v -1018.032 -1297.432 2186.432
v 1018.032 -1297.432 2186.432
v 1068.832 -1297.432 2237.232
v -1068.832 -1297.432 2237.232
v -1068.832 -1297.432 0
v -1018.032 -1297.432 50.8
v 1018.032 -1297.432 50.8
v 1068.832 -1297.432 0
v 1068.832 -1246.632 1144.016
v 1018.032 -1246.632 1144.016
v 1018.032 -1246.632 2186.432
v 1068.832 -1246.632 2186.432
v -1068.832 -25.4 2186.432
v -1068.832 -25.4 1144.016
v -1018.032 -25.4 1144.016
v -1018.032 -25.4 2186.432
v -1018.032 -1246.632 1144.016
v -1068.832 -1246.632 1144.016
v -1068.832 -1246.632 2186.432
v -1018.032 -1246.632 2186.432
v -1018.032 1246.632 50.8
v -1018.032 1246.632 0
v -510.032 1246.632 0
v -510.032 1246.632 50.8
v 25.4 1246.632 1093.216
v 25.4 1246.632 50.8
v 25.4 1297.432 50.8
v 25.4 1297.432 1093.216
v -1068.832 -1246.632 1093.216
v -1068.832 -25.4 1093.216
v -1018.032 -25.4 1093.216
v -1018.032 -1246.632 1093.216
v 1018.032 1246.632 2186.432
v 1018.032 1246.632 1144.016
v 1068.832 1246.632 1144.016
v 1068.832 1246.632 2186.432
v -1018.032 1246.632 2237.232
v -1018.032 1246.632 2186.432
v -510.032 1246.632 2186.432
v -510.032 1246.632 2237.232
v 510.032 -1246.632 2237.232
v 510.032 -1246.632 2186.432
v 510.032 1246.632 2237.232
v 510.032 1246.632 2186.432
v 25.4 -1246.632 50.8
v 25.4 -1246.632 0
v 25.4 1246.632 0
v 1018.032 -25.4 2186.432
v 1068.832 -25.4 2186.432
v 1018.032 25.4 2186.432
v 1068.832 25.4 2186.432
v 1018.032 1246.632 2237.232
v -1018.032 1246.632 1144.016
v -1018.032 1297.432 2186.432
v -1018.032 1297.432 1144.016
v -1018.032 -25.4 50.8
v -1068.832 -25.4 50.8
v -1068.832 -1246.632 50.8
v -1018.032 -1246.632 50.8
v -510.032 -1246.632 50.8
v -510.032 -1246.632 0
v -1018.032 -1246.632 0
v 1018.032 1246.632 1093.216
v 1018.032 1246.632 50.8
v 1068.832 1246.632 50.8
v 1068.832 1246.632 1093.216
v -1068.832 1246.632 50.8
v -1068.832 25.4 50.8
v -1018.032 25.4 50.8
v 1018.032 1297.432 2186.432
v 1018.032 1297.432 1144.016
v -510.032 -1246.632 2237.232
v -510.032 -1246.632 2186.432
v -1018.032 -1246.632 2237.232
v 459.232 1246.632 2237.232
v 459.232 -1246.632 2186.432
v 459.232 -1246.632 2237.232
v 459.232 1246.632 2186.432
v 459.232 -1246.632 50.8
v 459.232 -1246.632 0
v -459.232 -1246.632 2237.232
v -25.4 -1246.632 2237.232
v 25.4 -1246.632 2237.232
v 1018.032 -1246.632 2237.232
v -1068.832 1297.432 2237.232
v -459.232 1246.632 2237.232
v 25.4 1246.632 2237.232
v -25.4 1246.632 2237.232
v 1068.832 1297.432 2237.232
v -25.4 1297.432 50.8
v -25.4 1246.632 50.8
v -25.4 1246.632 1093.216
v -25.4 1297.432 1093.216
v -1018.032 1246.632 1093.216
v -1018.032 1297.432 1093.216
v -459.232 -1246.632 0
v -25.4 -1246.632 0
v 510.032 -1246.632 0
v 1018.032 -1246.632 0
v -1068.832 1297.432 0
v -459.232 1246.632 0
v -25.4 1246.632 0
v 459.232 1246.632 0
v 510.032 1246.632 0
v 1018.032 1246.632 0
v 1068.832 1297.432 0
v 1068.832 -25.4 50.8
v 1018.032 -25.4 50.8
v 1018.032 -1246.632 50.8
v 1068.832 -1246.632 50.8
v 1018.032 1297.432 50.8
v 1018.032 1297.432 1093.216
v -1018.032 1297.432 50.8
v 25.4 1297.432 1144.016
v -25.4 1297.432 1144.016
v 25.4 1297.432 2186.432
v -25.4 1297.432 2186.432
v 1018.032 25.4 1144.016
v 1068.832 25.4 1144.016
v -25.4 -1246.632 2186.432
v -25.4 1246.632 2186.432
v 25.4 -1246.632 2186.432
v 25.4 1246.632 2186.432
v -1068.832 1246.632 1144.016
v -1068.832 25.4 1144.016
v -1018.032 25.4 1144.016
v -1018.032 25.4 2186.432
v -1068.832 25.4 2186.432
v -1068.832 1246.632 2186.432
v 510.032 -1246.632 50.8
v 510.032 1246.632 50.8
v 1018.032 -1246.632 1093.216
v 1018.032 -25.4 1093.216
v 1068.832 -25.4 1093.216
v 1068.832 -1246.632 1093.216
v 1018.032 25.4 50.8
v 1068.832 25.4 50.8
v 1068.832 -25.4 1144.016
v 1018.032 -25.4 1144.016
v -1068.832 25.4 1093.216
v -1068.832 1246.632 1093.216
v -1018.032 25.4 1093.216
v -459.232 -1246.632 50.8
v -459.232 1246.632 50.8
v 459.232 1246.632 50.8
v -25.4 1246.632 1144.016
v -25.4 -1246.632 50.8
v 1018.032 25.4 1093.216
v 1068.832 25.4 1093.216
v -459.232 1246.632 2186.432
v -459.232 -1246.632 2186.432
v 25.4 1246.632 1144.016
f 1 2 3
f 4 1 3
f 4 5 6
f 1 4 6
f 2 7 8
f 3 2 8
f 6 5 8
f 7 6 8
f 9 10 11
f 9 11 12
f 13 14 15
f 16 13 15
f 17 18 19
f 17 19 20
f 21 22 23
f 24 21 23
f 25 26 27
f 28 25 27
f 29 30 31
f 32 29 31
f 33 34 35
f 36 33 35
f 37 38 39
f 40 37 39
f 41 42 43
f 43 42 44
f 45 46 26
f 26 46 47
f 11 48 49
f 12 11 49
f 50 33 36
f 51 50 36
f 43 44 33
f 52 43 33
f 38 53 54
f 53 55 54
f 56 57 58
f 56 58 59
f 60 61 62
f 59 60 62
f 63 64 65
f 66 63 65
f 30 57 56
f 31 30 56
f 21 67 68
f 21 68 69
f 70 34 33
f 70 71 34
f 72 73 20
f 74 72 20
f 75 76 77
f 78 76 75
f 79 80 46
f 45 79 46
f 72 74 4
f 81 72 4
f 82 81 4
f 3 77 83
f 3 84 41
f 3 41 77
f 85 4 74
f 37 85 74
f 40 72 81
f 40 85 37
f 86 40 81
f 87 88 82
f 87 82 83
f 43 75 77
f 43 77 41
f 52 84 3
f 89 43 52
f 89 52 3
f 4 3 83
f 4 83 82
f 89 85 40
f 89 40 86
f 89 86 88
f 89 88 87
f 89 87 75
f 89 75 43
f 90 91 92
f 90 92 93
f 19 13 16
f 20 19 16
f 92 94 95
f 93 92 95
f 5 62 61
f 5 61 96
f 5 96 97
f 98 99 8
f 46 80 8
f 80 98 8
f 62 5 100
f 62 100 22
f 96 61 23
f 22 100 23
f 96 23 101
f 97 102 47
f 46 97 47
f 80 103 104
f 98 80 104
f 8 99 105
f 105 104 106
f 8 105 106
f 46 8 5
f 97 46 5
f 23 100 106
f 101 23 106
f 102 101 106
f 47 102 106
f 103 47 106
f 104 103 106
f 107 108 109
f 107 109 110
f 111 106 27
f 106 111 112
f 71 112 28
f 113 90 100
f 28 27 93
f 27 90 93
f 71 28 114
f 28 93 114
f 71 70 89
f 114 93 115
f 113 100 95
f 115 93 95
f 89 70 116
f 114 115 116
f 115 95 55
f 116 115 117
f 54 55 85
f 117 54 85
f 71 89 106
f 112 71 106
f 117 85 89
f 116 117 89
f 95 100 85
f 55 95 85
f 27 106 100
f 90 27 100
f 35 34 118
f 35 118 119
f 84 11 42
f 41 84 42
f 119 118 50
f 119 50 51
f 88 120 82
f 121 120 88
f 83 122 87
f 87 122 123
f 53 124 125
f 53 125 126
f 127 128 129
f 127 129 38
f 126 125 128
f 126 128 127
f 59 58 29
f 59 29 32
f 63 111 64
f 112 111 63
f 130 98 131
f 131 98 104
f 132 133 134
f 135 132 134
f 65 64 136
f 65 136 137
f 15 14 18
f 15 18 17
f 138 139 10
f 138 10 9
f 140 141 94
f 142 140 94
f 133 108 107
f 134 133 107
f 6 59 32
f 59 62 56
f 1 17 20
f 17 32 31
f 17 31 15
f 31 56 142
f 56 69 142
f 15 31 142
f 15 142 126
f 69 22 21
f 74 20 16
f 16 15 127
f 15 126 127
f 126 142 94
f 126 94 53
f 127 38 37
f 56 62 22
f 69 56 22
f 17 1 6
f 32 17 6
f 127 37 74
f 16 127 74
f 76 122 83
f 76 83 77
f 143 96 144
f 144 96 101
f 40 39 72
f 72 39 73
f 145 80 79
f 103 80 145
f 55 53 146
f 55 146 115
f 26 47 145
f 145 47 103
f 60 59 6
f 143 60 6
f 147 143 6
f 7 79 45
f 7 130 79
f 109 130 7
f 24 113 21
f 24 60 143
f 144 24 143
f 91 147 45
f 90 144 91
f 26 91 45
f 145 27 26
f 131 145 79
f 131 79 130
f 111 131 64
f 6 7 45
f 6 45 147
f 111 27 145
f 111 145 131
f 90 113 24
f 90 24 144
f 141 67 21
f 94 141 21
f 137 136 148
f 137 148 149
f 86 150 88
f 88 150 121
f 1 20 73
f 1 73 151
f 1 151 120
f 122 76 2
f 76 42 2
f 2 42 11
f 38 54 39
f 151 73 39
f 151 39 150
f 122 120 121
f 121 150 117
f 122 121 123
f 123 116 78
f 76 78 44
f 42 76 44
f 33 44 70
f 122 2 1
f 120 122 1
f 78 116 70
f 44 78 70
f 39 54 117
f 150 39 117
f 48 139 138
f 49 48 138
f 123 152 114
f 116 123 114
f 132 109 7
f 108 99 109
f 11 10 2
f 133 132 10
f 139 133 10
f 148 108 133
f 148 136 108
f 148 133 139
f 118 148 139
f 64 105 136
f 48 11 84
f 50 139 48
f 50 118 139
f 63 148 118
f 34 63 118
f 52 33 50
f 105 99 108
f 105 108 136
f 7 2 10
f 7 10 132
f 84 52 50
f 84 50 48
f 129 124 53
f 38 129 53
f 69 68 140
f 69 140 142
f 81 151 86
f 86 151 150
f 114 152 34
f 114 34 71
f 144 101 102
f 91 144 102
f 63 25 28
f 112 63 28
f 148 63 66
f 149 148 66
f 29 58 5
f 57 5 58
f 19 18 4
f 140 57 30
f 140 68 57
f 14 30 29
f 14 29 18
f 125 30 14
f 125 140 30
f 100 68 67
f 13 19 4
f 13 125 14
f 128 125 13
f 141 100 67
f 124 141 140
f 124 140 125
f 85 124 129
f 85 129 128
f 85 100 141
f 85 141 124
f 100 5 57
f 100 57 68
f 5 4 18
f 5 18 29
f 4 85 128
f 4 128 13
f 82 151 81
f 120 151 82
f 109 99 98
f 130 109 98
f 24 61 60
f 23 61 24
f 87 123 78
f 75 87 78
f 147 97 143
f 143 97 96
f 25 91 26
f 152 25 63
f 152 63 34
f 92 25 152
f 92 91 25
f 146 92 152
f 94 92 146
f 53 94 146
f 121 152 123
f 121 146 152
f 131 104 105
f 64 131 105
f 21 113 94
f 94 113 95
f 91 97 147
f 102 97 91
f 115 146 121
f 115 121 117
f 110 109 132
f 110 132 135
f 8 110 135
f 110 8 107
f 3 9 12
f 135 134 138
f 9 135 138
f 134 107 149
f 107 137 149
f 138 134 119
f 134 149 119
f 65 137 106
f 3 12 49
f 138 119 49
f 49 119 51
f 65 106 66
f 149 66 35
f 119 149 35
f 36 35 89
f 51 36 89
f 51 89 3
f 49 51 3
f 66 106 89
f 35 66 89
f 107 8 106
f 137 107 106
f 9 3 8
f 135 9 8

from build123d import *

# Parameters (mm, degrees)
F0_W      = 2137.664
F0_H      = 2594.864
F0_W_2    = 50.8
F0_H_2    = 2493.264
F1_DEPTH  = 50.8
F2_W      = 50.8
F2_H      = 50.8
F3_DEPTH  = 2135.632
F4_W      = 433.832
F4_H      = 2493.264
F5_DEPTH  = 50.8
F6_W      = 50.8
F6_H      = 50.8
F7_DEPTH  = 2493.264
F8_W      = 50.8
F8_H      = 50.8
F9_DEPTH  = 2493.264
F10_W     = 50.8
F10_H     = 50.8
F11_DEPTH = 2036.064


with BuildPart() as f1:
    # F0 (on Top) → F1 (new body)
    with BuildSketch(Plane.XY):
        Rectangle(F0_W, F0_H)
        Polygon((-1018.032, -1246.632), (-1018.032, 1246.632), (-510.032, 1246.632), (-459.232, 1246.632), (-25.4, 1246.632), (25.4, 1246.632), (459.232, 1246.632), (510.032, 1246.632), (1018.032, 1246.632), (1018.032, -1246.632), (510.032, -1246.632), (459.232, -1246.632), (25.4, -1246.632), (-25.4, -1246.632), (-459.232, -1246.632), (-510.032, -1246.632), align=None, mode=Mode.SUBTRACT)
        with Locations((-484.632, 0)):
            Rectangle(F0_W_2, F0_H_2)
        Rectangle(F0_W_2, F0_H_2)
        with Locations((484.632, 0)):
            Rectangle(F0_W_2, F0_H_2)
    extrude(amount=F1_DEPTH)

    # F2 (on face) → F3 (join)
    with BuildSketch(Plane.XY.offset(50.8)):
        with Locations((-1043.432, 1272.032)):
            Rectangle(F2_W, F2_H)
        with Locations((1043.432, 1272.032)):
            Rectangle(F2_W, F2_H)
        with Locations((1043.432, -1272.032)):
            Rectangle(F2_W, F2_H)
        with Locations((-1043.432, -1272.032)):
            Rectangle(F2_W, F2_H)
        with Locations((-1043.432, 0)):
            Rectangle(F2_W, F2_H)
        with Locations((1043.432, 0)):
            Rectangle(F2_W, F2_H)
        with Locations((0, 1272.032)):
            Rectangle(F2_W, F2_H)
    extrude(amount=F3_DEPTH)

    # F4 (on face) → F5 (join)
    with BuildSketch(Plane.XY.offset(2186.432)):
        Polygon((-1068.832, 1297.432), (-1068.832, 1246.632), (-1068.832, 25.4), (-1068.832, -25.4), (-1068.832, -1246.632), (-1068.832, -1297.432), (-1018.032, -1297.432), (1018.032, -1297.432), (1068.832, -1297.432), (1068.832, -1246.632), (1068.832, -25.4), (1068.832, 25.4), (1068.832, 1246.632), (1068.832, 1297.432), (1018.032, 1297.432), (25.4, 1297.432), (-25.4, 1297.432), (-1018.032, 1297.432), align=None)
        Polygon((-1018.032, 25.4), (-1018.032, 1246.632), (-510.032, 1246.632), (-510.032, -1246.632), (-1018.032, -1246.632), (-1018.032, -25.4), align=None, mode=Mode.SUBTRACT)
        with Locations((-242.316, 0)):
            Rectangle(F4_W, F4_H, mode=Mode.SUBTRACT)
        with Locations((242.316, 0)):
            Rectangle(F4_W, F4_H, mode=Mode.SUBTRACT)
        Polygon((1018.032, -25.4), (1018.032, -1246.632), (510.032, -1246.632), (510.032, 1246.632), (1018.032, 1246.632), (1018.032, 25.4), align=None, mode=Mode.SUBTRACT)
    extrude(amount=F5_DEPTH)

    # F6 (on face) → F7 (join, through all)
    with BuildSketch(Plane.XZ.offset(-1246.632)):
        with Locations((-1043.432, 1118.616)):
            Rectangle(F6_W, F6_H)
    extrude(amount=F7_DEPTH)

    # F8 (on face) → F9 (join, through all)
    with BuildSketch(Plane.XZ.offset(-1246.632)):
        with Locations((1043.432, 1118.616)):
            Rectangle(F8_W, F8_H)
    extrude(amount=F9_DEPTH)

    # F10 (on face) → F11 (join, through all)
    with BuildSketch(Plane.YZ.offset(-1018.032)):
        with Locations((1272.032, 1118.616)):
            Rectangle(F10_W, F10_H)
    extrude(amount=F11_DEPTH)


solid = f1.part
